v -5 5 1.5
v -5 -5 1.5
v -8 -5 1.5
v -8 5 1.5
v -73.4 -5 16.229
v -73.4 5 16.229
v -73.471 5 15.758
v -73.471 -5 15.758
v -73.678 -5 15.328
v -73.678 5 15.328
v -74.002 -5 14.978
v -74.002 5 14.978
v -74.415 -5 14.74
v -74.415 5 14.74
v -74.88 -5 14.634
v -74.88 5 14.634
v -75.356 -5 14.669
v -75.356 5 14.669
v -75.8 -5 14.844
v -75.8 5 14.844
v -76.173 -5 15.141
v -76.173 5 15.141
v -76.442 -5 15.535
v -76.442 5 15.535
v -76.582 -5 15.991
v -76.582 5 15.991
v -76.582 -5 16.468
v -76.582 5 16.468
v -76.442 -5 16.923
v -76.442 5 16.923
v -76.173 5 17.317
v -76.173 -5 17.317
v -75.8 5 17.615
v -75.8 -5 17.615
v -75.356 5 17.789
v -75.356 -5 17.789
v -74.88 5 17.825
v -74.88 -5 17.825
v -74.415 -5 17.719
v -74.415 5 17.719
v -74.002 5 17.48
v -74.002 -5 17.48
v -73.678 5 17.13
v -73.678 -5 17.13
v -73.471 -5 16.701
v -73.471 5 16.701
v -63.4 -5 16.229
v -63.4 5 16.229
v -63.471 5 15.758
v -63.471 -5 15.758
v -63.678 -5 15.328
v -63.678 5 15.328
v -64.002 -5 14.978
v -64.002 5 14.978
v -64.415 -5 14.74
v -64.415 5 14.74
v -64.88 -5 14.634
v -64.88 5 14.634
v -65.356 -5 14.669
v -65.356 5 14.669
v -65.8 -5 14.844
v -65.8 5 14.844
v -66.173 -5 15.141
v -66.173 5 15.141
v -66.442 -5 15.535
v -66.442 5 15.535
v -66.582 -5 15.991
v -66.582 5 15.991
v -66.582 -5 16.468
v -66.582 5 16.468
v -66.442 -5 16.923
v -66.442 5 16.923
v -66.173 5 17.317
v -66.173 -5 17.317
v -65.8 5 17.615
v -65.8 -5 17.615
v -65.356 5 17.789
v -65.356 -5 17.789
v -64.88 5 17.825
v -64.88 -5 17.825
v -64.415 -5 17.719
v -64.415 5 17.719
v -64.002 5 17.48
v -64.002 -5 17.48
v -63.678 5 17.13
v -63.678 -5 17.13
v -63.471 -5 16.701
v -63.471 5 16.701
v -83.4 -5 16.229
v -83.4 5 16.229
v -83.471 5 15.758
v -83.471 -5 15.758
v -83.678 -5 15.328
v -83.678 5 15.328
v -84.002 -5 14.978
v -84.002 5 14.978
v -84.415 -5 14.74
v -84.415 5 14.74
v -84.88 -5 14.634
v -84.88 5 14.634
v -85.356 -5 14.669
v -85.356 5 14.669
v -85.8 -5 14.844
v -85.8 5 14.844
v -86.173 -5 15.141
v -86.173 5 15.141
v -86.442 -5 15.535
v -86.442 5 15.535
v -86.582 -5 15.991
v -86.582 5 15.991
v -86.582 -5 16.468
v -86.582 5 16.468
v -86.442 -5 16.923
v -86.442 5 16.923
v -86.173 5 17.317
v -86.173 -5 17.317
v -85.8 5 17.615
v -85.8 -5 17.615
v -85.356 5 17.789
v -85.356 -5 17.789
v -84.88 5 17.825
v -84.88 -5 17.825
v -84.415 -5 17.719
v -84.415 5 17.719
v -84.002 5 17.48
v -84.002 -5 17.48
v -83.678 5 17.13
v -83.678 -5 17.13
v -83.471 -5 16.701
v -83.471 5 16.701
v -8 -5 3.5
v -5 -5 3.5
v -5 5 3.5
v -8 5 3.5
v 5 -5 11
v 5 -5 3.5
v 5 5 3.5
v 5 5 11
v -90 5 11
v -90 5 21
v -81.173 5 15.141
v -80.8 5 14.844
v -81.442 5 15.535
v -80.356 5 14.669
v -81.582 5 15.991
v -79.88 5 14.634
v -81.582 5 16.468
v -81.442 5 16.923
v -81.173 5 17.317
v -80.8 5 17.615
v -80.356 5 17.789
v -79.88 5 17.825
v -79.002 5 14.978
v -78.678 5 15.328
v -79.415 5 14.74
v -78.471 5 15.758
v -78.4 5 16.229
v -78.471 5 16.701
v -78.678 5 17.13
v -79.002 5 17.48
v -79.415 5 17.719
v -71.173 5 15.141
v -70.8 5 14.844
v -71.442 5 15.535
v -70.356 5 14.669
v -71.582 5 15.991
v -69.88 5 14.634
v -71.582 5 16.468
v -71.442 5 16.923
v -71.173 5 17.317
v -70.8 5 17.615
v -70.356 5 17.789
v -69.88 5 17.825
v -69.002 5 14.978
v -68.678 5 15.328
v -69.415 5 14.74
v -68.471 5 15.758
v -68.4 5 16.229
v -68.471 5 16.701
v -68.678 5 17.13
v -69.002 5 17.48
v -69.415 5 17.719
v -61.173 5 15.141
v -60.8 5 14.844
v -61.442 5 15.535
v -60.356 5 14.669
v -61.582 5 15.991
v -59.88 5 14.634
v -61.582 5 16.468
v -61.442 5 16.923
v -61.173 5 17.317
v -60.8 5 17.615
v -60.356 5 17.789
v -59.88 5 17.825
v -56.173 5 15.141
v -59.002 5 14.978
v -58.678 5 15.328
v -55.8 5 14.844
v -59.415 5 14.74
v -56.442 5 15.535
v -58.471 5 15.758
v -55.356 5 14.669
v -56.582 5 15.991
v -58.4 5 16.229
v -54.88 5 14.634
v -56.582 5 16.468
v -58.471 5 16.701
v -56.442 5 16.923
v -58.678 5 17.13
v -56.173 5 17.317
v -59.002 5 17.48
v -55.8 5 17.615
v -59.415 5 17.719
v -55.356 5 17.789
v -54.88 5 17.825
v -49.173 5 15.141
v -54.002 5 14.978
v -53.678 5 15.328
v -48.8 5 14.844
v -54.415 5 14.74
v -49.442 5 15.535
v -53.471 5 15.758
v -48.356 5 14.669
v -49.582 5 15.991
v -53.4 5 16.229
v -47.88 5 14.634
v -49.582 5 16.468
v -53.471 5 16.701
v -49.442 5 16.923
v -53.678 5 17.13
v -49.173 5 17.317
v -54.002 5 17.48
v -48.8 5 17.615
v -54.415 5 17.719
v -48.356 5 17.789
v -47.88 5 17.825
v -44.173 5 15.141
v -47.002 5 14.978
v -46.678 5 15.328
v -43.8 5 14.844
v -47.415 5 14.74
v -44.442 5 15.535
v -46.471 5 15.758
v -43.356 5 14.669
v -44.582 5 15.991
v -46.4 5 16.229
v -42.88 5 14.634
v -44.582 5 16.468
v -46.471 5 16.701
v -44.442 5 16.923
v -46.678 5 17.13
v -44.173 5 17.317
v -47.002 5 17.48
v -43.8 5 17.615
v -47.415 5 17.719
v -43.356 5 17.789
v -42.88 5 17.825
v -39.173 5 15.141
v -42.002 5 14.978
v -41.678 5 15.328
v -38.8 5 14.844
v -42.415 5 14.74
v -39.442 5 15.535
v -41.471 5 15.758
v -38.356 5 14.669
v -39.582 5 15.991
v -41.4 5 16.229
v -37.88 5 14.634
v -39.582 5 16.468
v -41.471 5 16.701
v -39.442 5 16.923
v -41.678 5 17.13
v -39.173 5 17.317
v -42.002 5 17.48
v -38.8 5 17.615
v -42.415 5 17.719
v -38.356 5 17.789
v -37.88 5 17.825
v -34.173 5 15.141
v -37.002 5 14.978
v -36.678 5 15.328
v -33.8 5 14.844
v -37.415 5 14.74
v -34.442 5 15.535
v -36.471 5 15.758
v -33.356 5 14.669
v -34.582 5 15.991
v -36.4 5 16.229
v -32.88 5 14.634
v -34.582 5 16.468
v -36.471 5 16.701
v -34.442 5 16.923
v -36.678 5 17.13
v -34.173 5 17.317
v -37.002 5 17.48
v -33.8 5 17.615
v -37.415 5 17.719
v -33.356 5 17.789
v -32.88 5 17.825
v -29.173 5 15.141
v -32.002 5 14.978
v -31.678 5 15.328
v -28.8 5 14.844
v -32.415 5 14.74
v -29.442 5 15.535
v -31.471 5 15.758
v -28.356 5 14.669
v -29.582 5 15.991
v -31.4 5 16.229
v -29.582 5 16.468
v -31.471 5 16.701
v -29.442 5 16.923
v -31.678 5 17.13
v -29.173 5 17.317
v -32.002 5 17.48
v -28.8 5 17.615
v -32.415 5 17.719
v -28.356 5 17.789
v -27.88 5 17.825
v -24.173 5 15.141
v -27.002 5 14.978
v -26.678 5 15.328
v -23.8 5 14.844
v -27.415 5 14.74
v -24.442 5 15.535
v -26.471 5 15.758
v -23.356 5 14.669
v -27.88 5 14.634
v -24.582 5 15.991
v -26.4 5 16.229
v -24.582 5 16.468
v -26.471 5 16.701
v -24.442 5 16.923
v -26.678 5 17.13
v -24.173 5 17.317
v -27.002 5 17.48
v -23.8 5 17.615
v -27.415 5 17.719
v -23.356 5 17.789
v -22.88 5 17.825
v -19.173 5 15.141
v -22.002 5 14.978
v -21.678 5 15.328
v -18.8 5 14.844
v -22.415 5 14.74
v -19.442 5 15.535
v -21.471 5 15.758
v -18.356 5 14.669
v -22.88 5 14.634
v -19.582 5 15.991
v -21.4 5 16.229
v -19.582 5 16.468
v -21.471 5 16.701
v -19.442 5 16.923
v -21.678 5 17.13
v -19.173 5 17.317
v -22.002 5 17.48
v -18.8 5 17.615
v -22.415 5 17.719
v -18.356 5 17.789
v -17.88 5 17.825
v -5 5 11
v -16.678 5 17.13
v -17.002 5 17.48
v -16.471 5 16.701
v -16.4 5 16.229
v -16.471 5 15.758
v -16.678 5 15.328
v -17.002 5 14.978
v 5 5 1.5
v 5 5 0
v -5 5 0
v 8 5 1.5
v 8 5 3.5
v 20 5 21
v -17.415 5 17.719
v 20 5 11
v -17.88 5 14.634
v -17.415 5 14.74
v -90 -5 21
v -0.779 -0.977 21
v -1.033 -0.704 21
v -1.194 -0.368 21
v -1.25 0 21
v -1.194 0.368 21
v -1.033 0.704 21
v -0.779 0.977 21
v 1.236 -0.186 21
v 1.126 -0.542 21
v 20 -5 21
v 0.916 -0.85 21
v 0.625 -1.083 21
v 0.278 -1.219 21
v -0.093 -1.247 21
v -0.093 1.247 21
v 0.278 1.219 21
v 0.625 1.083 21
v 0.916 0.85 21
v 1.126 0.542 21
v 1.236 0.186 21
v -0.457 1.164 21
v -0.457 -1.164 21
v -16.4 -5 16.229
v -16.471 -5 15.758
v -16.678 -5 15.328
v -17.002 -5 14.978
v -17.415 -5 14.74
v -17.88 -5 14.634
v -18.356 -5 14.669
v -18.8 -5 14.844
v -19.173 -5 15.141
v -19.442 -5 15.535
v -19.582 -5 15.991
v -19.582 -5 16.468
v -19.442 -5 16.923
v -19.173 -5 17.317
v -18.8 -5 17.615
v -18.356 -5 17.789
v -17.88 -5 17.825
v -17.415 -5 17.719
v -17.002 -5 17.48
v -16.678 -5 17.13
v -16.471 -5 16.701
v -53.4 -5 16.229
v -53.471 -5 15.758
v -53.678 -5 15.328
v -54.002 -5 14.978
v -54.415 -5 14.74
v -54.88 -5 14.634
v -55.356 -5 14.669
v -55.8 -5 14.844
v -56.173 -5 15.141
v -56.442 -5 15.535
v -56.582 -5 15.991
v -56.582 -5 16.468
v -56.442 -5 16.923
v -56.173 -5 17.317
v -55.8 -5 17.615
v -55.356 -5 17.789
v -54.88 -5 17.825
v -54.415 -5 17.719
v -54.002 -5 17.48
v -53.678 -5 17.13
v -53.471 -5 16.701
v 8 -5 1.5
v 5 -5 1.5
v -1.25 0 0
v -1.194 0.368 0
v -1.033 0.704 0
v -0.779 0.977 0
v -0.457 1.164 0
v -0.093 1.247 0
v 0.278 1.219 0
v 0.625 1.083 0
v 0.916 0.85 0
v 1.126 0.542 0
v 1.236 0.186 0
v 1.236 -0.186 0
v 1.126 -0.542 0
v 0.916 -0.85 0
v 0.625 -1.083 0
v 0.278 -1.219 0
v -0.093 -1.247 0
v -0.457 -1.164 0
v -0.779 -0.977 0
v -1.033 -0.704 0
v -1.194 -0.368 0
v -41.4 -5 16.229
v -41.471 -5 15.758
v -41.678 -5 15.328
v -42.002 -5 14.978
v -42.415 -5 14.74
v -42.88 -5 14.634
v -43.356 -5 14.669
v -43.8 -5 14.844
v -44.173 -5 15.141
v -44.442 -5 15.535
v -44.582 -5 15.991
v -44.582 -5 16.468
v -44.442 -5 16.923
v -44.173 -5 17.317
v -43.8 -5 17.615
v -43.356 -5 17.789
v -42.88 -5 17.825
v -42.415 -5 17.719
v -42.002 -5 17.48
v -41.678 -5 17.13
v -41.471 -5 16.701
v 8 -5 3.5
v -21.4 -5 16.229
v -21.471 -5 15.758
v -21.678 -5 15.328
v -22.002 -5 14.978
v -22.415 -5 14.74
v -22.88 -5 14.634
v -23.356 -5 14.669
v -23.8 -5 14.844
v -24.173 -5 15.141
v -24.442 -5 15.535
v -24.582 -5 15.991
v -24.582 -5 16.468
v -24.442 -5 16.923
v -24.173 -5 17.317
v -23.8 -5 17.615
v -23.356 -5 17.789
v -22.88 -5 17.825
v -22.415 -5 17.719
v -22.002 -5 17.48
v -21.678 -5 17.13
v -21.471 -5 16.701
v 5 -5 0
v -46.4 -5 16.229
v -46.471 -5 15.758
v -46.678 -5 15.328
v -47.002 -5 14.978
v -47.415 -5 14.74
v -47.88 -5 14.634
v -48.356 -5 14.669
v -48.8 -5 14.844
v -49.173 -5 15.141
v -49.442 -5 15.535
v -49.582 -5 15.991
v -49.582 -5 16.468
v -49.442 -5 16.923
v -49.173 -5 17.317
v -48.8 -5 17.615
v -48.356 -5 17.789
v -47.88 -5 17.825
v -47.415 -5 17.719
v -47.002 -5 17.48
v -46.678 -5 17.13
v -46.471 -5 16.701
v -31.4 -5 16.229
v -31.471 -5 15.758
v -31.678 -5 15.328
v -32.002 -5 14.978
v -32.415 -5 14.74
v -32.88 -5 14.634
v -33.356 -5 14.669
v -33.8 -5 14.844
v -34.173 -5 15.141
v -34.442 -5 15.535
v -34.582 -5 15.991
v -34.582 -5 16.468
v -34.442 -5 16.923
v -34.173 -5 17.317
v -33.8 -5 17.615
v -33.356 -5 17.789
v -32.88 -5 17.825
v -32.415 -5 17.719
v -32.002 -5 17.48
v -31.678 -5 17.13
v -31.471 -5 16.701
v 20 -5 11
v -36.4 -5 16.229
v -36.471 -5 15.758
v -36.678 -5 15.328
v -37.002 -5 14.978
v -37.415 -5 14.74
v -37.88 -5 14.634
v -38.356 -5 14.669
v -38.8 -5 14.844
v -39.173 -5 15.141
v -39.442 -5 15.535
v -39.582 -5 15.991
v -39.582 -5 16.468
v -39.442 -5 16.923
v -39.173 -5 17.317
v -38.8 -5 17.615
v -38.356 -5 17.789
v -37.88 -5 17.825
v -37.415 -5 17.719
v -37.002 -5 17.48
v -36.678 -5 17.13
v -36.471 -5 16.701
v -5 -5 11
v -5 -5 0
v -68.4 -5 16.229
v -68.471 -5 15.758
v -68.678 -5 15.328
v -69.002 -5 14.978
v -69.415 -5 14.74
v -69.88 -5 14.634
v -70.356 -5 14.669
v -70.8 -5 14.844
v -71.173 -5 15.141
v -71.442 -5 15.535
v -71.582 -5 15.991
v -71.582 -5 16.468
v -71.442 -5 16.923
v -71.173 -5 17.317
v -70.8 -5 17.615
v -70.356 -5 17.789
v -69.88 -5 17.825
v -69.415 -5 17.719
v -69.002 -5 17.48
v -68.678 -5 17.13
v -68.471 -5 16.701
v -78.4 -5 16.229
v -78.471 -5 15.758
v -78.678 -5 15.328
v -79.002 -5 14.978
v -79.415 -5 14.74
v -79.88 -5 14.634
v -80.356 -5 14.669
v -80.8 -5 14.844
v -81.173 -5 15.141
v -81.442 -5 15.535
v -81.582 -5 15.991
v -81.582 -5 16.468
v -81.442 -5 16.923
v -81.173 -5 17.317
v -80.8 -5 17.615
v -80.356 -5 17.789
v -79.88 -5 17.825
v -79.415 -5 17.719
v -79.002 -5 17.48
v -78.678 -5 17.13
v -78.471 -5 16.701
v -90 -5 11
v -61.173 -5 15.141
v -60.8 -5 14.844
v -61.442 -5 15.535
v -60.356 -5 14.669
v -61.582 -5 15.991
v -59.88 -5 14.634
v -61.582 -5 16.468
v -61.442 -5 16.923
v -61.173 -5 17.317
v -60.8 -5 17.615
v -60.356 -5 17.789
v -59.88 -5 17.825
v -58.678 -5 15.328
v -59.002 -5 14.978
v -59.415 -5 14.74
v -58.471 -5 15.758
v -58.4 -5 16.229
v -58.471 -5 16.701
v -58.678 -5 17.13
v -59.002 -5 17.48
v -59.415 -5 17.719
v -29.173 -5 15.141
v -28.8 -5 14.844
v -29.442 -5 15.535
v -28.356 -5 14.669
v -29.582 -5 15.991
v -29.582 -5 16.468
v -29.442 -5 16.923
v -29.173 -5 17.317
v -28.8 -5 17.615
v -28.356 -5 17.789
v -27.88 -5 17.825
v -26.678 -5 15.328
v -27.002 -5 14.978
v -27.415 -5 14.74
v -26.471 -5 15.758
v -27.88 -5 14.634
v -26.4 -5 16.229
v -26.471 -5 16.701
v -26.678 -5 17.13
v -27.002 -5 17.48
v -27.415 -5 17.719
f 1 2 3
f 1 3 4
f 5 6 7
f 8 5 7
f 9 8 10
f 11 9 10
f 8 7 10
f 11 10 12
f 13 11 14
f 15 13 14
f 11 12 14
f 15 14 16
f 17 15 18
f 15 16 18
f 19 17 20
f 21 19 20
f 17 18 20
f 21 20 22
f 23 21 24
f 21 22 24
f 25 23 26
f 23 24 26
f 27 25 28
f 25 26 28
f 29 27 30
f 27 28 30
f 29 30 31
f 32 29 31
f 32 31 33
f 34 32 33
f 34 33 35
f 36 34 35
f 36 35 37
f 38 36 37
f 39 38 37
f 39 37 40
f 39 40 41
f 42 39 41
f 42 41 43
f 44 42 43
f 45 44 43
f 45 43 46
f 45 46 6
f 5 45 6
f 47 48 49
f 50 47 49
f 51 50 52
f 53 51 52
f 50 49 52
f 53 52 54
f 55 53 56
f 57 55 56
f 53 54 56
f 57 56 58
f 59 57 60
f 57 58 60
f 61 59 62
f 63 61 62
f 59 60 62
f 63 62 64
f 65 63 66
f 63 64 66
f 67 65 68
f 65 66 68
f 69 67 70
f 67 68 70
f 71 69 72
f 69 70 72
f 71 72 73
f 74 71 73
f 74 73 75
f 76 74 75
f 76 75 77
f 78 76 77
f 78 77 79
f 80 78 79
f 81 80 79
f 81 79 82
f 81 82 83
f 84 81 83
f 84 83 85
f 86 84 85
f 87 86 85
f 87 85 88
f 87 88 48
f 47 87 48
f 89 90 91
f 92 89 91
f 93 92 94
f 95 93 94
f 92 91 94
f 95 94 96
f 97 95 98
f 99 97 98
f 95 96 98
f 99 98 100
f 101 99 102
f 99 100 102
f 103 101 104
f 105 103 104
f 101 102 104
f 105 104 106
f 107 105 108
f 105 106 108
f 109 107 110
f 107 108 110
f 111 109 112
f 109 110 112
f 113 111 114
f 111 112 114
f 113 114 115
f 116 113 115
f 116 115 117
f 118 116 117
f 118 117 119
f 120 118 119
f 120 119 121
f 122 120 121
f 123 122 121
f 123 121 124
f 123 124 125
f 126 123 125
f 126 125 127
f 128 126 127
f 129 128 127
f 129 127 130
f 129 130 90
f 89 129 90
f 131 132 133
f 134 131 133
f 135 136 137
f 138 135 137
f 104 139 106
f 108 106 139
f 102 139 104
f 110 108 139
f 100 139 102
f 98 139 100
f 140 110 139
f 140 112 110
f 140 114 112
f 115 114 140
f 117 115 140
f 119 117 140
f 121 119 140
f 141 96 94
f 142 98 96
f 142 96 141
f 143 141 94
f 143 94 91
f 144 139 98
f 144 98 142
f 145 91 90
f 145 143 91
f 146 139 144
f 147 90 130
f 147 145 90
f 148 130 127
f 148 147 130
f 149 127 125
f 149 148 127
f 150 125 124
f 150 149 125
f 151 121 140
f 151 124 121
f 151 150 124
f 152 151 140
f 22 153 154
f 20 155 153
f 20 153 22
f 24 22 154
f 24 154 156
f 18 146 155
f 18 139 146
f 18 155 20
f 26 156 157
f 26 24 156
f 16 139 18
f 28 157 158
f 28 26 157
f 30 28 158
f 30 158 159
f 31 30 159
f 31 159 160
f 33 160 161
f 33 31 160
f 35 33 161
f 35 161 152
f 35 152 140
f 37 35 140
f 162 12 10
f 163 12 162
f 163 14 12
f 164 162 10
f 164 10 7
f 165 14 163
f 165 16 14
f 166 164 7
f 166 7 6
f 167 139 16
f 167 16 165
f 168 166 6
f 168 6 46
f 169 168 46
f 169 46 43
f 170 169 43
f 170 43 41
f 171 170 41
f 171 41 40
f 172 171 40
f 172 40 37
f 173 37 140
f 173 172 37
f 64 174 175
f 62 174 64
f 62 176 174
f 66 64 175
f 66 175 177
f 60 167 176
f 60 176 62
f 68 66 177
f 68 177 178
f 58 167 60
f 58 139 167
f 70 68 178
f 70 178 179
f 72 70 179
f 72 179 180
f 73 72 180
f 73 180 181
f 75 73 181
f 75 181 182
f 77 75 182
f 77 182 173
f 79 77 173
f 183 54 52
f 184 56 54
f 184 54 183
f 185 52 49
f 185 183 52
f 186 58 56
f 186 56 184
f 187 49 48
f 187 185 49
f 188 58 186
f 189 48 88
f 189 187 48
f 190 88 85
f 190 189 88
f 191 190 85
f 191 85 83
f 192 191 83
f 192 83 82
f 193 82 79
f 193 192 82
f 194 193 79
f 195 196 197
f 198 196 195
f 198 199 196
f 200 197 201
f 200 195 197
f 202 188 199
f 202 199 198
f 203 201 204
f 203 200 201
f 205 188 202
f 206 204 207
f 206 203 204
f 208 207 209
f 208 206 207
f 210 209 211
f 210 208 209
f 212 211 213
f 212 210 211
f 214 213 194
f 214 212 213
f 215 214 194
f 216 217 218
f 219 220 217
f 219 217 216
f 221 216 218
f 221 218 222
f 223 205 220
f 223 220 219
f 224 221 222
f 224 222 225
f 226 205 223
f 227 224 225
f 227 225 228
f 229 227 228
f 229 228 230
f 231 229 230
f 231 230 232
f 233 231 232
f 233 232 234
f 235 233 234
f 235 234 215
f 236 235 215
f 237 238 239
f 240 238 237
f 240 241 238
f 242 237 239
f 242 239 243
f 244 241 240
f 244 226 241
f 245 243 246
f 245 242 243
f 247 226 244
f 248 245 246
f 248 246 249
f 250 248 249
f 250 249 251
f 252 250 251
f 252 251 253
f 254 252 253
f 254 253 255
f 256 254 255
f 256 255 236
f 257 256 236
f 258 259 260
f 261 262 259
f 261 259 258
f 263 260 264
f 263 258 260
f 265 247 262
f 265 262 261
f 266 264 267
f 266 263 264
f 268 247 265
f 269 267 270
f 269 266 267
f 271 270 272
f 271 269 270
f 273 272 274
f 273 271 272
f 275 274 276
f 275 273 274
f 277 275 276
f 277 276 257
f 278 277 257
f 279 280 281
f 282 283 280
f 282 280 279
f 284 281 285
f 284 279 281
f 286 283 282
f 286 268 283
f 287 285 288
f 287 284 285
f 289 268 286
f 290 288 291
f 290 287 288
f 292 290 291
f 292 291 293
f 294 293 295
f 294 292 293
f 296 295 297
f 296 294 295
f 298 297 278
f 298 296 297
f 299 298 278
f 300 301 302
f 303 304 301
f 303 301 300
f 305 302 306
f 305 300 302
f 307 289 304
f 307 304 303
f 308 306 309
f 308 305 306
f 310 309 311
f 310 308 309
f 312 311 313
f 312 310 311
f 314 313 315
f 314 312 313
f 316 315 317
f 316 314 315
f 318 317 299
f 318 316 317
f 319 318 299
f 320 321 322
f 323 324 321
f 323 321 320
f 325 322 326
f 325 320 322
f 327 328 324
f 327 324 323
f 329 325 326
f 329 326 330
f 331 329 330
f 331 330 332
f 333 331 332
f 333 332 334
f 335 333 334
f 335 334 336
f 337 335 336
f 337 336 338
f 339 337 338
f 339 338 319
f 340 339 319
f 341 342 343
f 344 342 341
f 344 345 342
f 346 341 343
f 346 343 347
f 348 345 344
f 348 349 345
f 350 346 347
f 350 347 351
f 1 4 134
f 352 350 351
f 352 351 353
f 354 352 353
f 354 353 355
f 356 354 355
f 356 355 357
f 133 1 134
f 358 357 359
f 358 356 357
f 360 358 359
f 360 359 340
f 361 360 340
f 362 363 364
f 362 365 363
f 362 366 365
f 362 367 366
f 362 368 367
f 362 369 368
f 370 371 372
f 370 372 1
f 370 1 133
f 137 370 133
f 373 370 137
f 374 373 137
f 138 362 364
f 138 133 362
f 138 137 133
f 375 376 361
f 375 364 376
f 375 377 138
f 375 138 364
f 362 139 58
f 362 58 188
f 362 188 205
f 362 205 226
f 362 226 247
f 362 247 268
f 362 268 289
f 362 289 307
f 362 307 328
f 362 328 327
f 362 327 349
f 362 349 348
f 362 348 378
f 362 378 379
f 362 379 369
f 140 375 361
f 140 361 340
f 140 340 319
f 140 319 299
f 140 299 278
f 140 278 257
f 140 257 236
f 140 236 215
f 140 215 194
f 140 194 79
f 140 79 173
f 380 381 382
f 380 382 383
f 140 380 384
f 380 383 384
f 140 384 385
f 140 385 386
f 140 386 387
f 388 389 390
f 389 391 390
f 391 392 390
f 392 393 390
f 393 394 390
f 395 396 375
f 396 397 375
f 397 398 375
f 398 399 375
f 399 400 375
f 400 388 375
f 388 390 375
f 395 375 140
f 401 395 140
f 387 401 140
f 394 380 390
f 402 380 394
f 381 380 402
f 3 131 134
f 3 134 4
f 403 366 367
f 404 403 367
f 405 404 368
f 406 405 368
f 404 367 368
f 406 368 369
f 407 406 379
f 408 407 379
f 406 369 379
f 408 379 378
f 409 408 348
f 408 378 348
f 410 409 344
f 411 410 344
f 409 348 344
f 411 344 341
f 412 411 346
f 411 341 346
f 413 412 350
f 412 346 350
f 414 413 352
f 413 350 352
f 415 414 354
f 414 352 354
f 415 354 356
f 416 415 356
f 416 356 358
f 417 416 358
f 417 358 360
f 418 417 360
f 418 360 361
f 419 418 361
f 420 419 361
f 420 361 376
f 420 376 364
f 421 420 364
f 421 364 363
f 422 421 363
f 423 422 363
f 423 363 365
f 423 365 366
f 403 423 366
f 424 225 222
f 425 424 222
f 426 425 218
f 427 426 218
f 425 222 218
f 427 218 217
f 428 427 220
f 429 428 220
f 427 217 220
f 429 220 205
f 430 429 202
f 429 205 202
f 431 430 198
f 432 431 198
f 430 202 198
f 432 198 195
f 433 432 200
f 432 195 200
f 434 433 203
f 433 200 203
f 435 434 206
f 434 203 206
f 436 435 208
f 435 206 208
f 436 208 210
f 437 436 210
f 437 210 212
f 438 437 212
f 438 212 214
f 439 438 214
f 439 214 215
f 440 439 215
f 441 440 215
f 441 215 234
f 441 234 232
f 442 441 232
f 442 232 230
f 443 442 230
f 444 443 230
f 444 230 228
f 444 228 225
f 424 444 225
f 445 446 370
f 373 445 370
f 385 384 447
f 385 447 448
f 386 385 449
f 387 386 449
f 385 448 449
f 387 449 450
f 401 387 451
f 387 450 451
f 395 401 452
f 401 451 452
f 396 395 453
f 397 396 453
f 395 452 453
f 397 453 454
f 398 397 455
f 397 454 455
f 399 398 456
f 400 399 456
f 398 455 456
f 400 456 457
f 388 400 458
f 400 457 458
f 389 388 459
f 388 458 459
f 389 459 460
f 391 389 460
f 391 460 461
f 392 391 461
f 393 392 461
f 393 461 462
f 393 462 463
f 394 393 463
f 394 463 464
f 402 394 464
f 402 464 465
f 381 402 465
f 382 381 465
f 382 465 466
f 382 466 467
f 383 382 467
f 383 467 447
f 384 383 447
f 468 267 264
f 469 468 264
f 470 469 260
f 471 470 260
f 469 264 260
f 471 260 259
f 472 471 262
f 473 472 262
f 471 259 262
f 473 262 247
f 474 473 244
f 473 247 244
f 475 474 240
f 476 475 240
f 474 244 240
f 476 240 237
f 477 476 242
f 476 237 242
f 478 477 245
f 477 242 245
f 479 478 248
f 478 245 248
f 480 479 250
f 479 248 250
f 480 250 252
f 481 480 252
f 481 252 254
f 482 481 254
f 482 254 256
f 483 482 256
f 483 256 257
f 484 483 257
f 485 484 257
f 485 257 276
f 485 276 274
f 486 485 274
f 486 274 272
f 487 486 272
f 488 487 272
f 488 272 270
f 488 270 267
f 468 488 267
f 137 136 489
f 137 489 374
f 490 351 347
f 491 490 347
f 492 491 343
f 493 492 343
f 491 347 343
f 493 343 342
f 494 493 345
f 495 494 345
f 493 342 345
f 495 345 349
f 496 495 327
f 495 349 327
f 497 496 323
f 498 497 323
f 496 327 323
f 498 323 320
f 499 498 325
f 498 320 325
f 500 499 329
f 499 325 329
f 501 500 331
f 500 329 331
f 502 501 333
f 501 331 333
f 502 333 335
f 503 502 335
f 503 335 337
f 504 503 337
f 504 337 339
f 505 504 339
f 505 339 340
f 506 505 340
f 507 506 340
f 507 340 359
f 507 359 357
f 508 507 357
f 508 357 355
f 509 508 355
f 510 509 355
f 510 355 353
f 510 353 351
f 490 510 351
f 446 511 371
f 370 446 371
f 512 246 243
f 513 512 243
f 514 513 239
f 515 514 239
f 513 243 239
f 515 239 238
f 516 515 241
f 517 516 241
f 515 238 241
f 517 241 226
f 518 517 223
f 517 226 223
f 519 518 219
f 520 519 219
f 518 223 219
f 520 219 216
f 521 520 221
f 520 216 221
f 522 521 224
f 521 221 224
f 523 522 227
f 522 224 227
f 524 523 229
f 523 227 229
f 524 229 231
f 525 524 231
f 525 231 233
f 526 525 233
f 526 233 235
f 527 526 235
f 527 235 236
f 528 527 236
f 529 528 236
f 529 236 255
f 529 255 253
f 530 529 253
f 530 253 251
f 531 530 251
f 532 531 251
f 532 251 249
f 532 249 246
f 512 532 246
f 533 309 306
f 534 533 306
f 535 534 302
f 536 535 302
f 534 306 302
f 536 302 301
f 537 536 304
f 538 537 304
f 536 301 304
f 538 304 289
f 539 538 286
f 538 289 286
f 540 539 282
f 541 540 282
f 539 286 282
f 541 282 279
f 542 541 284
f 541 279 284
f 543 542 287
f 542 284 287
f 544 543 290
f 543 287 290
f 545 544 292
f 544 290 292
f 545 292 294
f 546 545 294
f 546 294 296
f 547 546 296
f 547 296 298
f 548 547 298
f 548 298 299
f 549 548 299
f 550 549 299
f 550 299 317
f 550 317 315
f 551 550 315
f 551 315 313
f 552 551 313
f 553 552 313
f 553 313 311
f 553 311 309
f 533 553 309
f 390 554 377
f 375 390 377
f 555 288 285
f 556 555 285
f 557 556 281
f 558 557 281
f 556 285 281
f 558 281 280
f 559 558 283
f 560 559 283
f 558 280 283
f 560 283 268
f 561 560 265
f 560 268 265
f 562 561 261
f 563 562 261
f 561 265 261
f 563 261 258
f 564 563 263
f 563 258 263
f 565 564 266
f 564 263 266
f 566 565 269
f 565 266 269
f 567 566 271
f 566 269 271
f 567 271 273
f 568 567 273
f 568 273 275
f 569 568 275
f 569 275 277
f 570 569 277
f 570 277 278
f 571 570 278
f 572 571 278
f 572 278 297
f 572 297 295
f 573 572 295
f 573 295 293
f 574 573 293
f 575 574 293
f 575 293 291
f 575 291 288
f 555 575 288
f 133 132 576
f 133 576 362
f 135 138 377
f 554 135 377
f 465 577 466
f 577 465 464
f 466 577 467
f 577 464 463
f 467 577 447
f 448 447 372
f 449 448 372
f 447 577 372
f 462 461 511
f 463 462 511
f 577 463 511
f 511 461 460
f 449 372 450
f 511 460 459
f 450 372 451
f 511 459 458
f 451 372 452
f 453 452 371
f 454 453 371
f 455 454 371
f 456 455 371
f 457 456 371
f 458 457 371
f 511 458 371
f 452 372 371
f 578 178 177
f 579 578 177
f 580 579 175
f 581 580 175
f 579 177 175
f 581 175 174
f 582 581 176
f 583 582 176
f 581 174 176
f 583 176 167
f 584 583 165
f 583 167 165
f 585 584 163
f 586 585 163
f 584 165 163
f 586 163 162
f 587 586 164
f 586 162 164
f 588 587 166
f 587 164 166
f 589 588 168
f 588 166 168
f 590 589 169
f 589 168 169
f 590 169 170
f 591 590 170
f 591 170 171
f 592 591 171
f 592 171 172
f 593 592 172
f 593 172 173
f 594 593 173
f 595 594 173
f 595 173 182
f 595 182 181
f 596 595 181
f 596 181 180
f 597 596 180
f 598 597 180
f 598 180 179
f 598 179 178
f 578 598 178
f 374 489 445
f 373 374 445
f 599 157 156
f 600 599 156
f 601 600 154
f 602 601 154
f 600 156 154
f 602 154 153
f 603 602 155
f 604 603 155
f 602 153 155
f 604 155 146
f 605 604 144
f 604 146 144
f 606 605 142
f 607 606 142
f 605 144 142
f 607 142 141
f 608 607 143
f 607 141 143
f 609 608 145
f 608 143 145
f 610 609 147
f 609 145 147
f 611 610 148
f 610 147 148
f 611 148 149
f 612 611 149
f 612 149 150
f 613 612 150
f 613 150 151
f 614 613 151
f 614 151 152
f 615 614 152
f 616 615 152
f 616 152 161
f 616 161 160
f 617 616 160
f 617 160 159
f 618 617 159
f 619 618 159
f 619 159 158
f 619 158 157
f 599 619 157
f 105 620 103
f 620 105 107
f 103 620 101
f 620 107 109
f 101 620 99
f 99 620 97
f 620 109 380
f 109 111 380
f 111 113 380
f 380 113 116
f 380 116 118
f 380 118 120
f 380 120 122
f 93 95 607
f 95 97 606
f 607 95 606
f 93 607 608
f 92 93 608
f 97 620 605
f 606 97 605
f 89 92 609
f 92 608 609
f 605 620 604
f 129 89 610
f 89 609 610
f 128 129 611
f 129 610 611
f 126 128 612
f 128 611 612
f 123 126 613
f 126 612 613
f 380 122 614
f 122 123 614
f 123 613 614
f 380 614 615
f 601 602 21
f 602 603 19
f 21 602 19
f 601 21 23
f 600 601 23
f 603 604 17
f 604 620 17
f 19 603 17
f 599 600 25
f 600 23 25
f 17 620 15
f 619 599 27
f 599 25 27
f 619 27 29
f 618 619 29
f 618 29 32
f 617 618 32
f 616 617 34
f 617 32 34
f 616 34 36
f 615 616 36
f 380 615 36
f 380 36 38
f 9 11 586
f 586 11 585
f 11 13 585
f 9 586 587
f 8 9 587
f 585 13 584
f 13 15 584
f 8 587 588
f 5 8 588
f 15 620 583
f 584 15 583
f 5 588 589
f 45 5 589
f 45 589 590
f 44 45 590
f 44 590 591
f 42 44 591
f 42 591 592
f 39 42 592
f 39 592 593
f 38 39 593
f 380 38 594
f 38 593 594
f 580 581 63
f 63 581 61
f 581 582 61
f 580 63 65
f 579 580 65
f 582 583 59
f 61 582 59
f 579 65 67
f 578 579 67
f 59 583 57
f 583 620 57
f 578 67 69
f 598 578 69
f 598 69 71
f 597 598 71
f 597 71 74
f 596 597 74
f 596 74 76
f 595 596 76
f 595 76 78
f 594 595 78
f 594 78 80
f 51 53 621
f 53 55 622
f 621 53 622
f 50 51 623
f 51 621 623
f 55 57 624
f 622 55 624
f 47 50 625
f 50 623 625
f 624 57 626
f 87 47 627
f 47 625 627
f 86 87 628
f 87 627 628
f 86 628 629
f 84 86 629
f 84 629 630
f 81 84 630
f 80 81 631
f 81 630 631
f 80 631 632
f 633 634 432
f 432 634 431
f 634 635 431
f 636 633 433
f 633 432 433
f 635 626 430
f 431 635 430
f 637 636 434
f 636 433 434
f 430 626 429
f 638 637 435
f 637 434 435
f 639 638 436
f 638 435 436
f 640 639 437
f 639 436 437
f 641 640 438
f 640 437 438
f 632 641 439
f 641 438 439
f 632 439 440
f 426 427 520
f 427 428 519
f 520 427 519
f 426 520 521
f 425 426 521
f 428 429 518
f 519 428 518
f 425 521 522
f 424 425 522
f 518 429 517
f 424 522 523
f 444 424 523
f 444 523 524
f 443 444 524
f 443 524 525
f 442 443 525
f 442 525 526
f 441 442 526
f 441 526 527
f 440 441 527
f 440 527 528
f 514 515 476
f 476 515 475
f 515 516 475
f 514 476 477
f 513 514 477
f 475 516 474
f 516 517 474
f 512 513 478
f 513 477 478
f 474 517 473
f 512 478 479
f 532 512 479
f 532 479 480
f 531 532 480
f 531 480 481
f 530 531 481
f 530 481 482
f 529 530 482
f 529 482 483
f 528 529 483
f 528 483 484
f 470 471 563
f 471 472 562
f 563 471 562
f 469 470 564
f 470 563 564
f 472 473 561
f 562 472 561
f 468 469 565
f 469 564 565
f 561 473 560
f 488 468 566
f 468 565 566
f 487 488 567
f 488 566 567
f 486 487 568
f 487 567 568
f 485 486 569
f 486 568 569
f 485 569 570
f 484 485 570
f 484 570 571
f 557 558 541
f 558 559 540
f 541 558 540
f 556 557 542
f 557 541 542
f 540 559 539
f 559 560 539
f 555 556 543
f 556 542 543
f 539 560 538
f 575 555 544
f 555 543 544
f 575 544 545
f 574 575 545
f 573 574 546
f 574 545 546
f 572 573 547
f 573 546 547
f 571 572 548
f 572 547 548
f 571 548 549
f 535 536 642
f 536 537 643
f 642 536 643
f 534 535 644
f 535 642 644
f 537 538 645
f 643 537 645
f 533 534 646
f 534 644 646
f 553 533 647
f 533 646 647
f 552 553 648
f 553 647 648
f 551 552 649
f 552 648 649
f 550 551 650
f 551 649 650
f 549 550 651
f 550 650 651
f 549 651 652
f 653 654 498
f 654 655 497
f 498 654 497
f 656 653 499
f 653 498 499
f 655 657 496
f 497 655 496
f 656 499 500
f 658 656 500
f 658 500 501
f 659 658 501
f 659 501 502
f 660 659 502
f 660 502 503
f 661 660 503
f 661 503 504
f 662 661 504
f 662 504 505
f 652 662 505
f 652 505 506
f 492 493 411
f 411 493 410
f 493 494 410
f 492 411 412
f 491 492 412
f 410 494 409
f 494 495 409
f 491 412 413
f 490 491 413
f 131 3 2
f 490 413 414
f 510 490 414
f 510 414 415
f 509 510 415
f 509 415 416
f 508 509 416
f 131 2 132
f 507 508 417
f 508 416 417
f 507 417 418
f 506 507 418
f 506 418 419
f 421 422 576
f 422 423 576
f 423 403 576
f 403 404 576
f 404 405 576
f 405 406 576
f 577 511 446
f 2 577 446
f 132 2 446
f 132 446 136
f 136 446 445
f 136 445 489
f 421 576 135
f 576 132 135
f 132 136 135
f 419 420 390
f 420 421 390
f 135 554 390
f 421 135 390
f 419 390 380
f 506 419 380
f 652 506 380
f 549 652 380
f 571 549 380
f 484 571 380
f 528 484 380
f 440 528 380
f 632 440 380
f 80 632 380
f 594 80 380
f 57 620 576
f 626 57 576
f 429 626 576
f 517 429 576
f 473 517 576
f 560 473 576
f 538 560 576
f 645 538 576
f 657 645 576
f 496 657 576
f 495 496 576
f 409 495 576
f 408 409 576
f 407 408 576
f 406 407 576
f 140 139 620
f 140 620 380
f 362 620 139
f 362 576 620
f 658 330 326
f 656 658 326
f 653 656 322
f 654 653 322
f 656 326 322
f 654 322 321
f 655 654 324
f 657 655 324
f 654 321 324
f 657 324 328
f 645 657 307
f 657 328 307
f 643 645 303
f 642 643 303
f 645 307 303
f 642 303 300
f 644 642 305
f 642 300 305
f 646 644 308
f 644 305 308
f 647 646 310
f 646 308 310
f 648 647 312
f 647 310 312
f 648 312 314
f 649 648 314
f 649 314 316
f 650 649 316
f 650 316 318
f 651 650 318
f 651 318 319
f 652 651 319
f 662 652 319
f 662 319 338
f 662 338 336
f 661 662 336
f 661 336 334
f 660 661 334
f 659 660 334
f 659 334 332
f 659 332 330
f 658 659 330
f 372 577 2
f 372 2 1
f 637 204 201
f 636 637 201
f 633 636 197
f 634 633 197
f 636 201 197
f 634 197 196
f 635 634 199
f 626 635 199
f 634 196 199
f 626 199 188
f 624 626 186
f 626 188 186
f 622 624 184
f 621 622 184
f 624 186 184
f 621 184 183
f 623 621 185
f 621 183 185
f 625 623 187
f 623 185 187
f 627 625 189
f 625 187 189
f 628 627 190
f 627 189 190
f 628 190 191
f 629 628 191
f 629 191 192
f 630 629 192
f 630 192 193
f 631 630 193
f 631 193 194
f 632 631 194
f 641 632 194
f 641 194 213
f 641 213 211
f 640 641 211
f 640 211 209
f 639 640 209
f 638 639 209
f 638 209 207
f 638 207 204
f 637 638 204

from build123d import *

# Parameters (mm, degrees)
SKETCH1_W                  = 10
SKETCH1_H                  = 10
BOSS_EXTRUDE1_DEPTH        = 11
SKETCH2_W                  = 2
SKETCH2_H                  = 10
BOSS_EXTRUDE2_DEPTH        = 3
BOSS_EXTRUDE2_DEPTH_BACK   = 13
SKETCH3_W                  = 40
SKETCH3_H                  = 10
BOSS_EXTRUDE3_DEPTH        = 10
SKETCH5_W                  = 10
SKETCH5_H                  = 10
BOSS_EXTRUDE4_DEPTH        = 70
F_2_5MM_DOWEL_SLOT1_D      = 2.5
F_3_2_3_2_DIAMETER_SLOT2_D = 3.2


with BuildPart() as part:
    # Sketch1 → Boss-Extrude1 (new body)
    with BuildSketch(Plane.XY):
        Rectangle(SKETCH1_W, SKETCH1_H)
    extrude(amount=BOSS_EXTRUDE1_DEPTH)

    # Sketch2 → Boss-Extrude2 (add, two sides)
    with BuildSketch(Plane(origin=(5, 0, 0), x_dir=(0, 0, -1), z_dir=(1, 0, 0))) as boss_extrude2_sk:
        with Locations((-2.5, 0)):
            Rectangle(SKETCH2_W, SKETCH2_H)
    extrude(amount=BOSS_EXTRUDE2_DEPTH)
    extrude(boss_extrude2_sk.sketch, amount=-BOSS_EXTRUDE2_DEPTH_BACK)

    # Sketch3 → Boss-Extrude3 (add)
    with BuildSketch(Plane.XY.offset(11)):
        Rectangle(SKETCH3_W, SKETCH3_H)
    extrude(amount=BOSS_EXTRUDE3_DEPTH)

    # Sketch5 → Boss-Extrude4 (add)
    with BuildSketch(Plane.ZY.offset(20)):
        with Locations((16, 0)):
            Rectangle(SKETCH5_W, SKETCH5_H)
    extrude(amount=BOSS_EXTRUDE4_DEPTH)

    # Ø2.5mm Dowel Slot1 (through all)
    with Locations(Plane.XY.offset(21)):
        with Locations((0, 0)):
            Hole(F_2_5MM_DOWEL_SLOT1_D / 2)

    # Ø3.2 (3.2) Diameter Slot2 (through all)
    with Locations(Plane(origin=(0, -5, 0), x_dir=(-1, 0, 0), z_dir=(0, -1, 0))):
        with Locations((85, -16.229165357), (80, -16.229165357), (48, -16.229165357), (43, -16.229165357), (75, -16.229165357), (70, -16.229165357), (65, -16.229165357), (60, -16.229165357), (38, -16.229165357), (33, -16.229165357), (28, -16.229165357), (23, -16.229165357), (55, -16.229165357), (18, -16.229165357)):
            Hole(F_3_2_3_2_DIAMETER_SLOT2_D / 2)


solid = part.part
